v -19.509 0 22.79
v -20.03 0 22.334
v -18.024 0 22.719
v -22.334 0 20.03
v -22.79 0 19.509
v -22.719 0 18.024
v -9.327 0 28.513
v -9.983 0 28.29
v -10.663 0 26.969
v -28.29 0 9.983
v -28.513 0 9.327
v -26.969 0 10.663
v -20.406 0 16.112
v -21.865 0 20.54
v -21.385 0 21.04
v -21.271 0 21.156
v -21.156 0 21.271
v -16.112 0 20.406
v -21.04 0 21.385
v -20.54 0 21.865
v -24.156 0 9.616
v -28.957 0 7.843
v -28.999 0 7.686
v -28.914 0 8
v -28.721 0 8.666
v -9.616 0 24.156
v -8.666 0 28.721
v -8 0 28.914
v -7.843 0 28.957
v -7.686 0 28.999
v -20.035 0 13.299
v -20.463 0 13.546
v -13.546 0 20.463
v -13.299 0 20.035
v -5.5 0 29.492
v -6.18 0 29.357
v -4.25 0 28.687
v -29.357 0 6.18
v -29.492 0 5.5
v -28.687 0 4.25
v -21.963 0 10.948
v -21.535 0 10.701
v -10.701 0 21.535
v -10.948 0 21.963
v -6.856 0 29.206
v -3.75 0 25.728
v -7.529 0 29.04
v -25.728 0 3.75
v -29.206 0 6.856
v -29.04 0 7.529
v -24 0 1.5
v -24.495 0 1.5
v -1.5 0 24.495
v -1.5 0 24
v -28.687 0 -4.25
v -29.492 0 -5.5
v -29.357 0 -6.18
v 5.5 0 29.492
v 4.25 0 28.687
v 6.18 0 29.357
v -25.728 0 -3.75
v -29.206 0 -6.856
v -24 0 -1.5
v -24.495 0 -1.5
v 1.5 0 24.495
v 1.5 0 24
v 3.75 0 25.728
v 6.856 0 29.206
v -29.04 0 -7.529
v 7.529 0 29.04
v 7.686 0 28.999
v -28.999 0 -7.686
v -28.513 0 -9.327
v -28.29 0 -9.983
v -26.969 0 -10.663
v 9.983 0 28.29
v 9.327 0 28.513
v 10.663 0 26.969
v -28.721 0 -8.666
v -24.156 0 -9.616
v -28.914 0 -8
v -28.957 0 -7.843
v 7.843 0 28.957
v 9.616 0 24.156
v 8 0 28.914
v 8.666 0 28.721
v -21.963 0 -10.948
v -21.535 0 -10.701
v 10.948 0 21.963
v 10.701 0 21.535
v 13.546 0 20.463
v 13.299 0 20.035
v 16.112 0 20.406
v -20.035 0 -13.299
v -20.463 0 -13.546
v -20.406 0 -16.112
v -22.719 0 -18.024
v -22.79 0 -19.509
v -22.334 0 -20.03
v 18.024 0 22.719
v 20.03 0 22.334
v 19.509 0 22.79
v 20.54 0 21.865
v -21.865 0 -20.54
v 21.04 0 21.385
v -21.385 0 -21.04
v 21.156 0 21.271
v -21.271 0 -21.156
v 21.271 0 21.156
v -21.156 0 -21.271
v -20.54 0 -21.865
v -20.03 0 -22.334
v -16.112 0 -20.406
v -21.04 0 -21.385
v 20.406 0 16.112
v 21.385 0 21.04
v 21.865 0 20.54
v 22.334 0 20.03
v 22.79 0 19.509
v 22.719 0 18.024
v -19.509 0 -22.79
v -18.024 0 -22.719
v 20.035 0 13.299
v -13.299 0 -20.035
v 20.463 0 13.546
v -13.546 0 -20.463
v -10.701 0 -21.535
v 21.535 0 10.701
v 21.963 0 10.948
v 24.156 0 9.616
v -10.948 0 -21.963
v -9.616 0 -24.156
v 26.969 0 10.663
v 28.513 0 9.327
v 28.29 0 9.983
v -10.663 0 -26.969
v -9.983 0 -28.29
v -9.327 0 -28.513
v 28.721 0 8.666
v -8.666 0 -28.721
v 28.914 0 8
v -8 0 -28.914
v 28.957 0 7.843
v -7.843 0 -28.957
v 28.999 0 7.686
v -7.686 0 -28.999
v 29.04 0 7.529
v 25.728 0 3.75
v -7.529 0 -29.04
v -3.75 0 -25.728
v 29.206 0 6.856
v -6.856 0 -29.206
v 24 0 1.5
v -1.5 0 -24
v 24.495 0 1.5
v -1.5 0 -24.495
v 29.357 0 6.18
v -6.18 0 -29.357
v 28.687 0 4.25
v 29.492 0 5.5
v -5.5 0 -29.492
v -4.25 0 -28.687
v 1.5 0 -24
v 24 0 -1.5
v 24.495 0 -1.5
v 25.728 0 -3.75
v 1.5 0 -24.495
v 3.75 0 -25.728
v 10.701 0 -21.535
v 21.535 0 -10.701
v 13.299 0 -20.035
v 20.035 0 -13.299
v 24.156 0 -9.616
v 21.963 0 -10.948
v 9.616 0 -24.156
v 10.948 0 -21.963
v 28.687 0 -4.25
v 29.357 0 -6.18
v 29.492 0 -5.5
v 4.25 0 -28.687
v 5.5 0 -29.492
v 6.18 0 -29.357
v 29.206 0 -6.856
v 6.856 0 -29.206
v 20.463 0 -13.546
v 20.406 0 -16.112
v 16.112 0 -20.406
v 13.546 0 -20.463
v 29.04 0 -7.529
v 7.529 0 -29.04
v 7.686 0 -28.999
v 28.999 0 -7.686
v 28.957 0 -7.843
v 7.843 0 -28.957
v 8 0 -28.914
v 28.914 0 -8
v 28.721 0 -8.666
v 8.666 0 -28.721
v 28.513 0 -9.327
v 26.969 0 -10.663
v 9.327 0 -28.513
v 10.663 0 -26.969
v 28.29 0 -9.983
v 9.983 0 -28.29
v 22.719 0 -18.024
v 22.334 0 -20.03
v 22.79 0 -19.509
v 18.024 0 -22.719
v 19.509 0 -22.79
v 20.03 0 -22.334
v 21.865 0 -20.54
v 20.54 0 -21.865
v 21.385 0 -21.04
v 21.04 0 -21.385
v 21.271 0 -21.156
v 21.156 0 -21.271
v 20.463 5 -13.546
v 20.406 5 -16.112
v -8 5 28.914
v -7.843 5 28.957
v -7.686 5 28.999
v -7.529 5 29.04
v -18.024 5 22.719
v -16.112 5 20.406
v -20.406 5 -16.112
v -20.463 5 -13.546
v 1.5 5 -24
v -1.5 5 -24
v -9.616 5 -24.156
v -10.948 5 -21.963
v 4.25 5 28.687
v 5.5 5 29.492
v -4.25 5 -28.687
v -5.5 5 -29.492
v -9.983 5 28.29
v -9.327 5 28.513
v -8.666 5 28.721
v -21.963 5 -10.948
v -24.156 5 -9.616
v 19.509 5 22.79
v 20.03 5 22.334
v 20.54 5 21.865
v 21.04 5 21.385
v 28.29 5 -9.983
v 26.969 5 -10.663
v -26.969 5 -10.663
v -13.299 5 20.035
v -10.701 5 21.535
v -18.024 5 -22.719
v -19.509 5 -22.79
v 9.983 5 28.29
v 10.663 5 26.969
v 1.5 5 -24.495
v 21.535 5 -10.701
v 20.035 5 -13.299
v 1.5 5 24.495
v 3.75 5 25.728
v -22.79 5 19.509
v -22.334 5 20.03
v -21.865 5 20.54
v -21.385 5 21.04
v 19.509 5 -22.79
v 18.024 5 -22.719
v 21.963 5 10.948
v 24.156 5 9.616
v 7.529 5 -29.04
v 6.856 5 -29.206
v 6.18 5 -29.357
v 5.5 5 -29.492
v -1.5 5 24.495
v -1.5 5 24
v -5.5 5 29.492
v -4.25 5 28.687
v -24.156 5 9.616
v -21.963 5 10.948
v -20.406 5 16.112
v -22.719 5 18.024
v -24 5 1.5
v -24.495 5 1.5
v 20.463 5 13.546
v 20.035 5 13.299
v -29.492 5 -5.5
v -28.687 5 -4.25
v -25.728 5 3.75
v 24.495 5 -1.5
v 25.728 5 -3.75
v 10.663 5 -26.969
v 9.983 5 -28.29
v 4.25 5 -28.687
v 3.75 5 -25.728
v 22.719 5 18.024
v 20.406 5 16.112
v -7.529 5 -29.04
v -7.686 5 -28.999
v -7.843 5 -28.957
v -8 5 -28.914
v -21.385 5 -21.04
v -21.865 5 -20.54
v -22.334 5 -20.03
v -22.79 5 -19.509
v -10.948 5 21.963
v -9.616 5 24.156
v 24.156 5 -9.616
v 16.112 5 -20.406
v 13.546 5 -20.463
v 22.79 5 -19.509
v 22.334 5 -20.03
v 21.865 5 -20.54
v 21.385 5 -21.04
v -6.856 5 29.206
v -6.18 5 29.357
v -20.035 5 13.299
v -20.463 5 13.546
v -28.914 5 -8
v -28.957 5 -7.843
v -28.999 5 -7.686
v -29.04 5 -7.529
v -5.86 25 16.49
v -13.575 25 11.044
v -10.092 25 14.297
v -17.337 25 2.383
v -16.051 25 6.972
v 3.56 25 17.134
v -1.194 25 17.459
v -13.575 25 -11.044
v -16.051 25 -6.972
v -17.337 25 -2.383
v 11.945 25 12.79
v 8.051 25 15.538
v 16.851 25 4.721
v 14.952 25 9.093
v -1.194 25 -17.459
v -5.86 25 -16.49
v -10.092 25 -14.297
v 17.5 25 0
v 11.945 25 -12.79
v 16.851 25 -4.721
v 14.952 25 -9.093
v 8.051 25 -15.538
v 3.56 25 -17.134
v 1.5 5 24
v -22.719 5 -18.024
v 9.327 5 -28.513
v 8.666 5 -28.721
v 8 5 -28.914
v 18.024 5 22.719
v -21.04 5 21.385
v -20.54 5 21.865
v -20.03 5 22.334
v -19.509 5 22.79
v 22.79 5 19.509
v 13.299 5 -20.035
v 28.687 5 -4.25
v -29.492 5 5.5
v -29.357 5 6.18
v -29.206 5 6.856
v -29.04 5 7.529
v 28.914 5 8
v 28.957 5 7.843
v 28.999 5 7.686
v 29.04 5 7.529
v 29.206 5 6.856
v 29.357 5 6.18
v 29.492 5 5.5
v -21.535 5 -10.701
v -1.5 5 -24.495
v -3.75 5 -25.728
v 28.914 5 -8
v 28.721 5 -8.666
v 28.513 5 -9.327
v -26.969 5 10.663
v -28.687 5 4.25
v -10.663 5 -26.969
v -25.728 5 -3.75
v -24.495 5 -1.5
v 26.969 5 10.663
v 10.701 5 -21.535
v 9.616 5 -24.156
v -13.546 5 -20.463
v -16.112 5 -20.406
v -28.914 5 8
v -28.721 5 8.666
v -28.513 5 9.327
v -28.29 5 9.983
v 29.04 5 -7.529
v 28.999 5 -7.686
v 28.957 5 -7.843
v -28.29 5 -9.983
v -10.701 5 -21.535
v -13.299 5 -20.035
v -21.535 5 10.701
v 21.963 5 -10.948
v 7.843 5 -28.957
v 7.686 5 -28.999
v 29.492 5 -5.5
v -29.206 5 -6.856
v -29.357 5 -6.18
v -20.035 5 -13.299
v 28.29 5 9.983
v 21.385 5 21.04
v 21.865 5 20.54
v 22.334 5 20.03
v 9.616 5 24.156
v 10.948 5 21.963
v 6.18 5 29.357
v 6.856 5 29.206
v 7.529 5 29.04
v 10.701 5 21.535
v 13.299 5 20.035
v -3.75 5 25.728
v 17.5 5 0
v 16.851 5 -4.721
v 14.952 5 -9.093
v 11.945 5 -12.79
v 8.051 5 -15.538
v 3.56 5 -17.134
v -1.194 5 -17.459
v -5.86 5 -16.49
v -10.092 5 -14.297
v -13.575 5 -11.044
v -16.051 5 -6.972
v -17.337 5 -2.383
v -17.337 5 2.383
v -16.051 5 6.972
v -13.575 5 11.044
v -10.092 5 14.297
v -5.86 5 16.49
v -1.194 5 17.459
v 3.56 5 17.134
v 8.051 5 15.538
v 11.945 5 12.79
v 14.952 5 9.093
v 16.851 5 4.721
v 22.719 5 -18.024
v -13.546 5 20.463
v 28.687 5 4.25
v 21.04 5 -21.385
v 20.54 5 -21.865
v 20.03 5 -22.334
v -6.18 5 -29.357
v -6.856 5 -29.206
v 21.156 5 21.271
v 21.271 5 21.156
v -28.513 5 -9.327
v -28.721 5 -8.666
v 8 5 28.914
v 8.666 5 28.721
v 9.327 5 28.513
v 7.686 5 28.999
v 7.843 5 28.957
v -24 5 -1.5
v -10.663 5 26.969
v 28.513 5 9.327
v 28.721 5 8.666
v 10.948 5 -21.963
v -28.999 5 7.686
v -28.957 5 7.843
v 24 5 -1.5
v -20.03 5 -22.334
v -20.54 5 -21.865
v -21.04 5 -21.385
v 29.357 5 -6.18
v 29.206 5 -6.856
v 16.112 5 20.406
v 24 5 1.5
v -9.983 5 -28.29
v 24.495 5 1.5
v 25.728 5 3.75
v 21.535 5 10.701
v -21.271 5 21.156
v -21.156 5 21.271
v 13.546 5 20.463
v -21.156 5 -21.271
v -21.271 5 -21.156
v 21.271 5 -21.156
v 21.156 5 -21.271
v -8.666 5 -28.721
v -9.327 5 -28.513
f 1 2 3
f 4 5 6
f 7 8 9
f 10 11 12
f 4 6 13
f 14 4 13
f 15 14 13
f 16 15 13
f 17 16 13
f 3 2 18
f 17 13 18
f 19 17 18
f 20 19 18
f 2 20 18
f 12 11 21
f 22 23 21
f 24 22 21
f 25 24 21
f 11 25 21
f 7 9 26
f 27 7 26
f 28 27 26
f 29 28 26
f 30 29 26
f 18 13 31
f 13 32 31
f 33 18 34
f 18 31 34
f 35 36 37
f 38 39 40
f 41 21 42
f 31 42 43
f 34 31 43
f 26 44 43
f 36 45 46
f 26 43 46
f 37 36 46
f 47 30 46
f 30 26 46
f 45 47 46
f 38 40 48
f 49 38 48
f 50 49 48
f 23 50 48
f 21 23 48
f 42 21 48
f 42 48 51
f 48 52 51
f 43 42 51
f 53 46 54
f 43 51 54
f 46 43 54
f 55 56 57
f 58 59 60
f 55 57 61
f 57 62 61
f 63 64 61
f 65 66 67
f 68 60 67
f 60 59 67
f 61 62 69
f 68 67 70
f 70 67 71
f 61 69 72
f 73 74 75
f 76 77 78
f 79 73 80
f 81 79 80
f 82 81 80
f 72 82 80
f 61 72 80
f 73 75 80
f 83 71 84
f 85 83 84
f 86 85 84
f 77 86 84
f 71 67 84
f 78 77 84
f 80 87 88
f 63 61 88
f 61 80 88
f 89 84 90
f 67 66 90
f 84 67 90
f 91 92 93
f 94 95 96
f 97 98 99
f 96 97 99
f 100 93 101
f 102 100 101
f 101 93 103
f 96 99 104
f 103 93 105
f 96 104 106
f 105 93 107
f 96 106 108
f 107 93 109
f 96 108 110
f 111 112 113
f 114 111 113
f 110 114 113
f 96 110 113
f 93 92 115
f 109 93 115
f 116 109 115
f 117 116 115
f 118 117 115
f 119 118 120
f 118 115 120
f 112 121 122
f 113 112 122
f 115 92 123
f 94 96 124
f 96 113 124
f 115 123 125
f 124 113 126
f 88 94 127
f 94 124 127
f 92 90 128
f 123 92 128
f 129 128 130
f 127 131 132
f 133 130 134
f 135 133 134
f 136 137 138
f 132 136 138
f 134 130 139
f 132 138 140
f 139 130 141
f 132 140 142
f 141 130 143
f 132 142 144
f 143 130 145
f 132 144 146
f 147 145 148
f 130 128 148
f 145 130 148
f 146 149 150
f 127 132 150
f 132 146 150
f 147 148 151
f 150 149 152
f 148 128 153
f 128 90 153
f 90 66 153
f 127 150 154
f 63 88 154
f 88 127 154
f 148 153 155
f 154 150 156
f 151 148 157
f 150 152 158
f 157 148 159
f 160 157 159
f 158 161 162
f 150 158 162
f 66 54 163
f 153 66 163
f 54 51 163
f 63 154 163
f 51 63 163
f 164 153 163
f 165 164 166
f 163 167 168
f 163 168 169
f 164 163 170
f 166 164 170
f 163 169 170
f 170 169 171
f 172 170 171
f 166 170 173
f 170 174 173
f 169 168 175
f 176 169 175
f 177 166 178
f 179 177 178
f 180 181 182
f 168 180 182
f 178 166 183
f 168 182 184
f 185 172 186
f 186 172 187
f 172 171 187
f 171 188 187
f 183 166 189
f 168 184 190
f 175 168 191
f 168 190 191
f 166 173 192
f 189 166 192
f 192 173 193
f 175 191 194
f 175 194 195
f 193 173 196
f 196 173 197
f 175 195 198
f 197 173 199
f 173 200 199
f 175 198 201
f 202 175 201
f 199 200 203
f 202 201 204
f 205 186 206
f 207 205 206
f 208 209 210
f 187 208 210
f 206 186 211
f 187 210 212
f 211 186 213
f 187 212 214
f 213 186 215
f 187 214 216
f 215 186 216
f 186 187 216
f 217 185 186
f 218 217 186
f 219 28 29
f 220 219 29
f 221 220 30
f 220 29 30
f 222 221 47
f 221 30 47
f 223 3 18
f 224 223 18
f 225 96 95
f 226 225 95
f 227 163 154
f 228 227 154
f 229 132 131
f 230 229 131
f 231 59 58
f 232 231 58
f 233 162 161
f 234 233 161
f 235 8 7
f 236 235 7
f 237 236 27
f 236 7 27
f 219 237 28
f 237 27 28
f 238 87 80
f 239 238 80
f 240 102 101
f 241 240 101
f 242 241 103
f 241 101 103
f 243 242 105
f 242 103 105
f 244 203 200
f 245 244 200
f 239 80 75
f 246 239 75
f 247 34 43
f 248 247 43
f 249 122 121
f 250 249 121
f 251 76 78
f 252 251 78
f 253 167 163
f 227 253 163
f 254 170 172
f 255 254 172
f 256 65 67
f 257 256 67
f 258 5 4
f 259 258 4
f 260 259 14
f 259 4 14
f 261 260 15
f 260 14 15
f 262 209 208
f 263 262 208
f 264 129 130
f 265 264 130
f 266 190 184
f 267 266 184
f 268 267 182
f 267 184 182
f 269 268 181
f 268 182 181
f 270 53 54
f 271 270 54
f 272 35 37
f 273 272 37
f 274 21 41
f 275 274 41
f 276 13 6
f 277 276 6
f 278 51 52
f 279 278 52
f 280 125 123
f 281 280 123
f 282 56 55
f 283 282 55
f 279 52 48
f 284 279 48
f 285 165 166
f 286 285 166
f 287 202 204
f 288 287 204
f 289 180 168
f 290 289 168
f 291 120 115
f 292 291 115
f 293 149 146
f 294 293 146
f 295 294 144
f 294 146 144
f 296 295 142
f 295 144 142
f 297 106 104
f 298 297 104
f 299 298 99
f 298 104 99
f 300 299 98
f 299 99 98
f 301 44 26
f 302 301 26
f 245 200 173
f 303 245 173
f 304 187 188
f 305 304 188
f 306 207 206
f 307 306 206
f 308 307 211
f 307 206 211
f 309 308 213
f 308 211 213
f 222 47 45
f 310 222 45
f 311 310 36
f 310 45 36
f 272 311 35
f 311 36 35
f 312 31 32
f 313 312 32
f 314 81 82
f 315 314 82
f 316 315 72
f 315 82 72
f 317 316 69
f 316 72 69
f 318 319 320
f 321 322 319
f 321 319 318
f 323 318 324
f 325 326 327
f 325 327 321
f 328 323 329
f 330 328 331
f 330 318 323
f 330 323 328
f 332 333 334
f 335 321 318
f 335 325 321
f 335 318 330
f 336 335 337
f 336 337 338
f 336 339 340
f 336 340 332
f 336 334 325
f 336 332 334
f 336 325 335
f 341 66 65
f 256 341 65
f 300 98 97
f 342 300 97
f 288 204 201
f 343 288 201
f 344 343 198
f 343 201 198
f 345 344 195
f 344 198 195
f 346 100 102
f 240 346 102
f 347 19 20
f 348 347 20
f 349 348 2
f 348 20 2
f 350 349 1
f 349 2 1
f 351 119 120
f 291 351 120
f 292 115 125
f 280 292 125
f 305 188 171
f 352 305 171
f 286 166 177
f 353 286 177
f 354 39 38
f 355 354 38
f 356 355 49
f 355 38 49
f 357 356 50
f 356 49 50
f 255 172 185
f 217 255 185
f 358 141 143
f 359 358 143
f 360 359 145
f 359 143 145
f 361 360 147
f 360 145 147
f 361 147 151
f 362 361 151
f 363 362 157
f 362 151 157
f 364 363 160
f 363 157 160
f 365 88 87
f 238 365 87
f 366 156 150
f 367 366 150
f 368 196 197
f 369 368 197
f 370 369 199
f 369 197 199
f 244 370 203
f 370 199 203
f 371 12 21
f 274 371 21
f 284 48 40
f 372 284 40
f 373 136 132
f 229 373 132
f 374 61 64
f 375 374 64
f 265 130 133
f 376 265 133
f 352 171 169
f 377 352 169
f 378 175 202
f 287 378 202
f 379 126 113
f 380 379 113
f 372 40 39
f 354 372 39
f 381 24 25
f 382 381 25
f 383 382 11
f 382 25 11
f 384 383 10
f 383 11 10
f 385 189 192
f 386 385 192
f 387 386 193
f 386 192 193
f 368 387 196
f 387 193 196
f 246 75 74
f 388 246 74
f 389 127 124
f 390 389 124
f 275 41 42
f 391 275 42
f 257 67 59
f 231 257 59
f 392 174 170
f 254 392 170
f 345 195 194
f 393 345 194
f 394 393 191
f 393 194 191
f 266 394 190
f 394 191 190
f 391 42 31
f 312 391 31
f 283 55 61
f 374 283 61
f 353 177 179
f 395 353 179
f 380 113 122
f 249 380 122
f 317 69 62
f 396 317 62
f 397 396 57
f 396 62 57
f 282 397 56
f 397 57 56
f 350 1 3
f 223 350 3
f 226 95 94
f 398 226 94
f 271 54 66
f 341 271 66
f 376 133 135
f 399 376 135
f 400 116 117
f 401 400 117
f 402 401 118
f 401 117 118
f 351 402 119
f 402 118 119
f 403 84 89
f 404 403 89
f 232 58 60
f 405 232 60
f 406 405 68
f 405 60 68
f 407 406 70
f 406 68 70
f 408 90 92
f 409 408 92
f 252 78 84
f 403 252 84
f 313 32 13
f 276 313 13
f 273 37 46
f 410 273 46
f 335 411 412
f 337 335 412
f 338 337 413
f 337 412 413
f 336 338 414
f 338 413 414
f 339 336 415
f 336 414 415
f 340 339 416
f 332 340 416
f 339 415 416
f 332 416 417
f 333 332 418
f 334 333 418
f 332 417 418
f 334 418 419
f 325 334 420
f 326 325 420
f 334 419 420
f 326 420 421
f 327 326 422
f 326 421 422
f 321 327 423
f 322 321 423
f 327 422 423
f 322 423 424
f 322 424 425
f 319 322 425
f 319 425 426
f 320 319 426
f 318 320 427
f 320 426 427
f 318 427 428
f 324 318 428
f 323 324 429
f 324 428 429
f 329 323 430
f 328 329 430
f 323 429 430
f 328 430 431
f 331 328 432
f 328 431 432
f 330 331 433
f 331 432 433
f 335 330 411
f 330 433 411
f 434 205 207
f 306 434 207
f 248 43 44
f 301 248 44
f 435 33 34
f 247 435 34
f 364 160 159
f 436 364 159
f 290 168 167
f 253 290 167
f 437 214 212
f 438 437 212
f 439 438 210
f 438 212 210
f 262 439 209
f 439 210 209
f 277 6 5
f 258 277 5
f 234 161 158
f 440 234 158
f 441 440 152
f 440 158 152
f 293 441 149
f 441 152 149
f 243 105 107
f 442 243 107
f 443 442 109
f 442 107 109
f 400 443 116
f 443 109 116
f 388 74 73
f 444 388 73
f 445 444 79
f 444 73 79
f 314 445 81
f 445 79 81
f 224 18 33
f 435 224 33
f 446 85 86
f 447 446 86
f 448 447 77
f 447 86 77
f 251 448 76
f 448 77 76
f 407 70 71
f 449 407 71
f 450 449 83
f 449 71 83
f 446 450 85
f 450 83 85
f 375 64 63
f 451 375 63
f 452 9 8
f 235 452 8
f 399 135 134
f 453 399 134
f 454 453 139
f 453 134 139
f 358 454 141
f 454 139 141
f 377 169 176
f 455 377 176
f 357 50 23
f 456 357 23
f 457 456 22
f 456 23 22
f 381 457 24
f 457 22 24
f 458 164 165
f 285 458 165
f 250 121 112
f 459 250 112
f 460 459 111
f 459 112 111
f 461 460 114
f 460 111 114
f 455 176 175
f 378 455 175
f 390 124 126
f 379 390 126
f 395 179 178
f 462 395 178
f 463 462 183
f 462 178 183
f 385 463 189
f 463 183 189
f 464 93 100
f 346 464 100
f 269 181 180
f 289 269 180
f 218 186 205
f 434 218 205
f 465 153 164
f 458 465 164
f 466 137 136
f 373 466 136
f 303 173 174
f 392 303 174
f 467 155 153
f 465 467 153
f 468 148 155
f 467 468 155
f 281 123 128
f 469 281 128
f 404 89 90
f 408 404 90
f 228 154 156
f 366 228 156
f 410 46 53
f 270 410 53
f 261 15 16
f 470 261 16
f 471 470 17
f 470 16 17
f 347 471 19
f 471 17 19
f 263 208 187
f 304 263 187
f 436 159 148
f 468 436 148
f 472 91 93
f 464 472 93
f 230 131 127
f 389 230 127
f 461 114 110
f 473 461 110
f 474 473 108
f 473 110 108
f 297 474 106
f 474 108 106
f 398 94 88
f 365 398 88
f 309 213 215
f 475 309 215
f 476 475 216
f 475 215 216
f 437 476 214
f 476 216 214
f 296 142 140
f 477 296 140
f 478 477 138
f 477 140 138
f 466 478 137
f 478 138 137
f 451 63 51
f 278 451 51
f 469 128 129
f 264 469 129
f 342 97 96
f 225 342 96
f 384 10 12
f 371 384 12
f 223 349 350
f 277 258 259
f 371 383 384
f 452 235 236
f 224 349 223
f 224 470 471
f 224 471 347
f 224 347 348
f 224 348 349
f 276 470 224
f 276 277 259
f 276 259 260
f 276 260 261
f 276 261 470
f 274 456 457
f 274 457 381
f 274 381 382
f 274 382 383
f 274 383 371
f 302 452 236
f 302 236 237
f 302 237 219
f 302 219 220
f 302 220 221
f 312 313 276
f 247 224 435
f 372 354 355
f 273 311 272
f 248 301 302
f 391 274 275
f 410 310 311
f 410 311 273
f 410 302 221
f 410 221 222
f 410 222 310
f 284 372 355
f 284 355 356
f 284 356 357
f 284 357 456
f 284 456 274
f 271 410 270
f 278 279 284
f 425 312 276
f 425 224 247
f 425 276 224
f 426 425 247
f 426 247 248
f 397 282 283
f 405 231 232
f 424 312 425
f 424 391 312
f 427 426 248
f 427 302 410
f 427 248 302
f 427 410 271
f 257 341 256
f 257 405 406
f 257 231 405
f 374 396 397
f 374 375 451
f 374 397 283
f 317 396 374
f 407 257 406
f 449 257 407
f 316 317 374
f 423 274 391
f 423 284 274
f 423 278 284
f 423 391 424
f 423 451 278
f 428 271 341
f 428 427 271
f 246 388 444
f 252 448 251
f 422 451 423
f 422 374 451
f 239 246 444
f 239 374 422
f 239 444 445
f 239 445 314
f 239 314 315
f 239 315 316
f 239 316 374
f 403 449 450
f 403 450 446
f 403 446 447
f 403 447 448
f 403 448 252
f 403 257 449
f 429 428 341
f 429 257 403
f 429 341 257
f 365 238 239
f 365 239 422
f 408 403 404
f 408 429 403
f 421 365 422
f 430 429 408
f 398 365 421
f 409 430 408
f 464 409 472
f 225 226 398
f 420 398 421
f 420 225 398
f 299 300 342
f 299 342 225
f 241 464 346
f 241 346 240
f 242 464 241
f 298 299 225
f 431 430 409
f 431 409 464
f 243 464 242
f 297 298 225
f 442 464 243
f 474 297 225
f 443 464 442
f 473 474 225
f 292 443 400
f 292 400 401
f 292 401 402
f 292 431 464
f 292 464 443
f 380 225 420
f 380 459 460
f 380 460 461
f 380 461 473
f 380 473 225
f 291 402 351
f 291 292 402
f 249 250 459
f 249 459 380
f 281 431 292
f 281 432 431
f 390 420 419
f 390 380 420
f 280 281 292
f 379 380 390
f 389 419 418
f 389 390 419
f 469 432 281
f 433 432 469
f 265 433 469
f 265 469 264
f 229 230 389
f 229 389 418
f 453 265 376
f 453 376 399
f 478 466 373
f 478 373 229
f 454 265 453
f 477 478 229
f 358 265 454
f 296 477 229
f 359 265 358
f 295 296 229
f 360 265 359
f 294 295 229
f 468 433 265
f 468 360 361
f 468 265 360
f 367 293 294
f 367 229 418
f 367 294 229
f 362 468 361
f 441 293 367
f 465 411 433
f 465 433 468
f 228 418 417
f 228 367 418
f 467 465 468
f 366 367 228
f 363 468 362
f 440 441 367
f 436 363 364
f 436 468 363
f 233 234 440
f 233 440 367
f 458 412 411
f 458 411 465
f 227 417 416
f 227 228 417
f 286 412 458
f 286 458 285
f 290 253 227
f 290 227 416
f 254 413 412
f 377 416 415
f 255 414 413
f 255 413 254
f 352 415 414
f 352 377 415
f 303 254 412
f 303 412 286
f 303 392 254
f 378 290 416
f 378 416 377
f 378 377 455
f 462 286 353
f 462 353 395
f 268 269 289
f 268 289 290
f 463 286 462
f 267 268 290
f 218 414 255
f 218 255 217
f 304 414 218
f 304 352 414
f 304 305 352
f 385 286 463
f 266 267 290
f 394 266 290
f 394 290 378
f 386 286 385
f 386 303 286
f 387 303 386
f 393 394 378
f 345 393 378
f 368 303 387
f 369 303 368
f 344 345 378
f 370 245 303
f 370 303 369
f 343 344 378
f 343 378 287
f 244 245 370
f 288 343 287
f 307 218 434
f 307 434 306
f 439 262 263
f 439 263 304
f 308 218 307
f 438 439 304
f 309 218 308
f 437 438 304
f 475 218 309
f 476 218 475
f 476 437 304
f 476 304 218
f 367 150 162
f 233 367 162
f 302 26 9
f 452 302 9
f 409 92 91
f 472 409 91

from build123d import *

# Parameters (mm, degrees)
BOSS_EXTRUDE1_DEPTH = 5
SKETCH2_R           = 17.5
BOSS_EXTRUDE3_DEPTH = 20


with BuildPart() as part:
    # Sketch1 → Boss-Extrude1 (new body)
    with BuildSketch(Plane(origin=(0, 0, 0), x_dir=(1, 0, 0), z_dir=(0, 1, 0))):
        with BuildLine():
            Line((-1.5, 24.494818027), (-3.75, 25.728146066))
            Line((-3.75, 25.728146066), (-4.25, 28.686887248))
            Line((-4.25, 28.686887248), (-5.5, 29.491524206))
            ThreePointArc((-5.5, 29.491524206), (-6.518225952, 29.283318296), (-7.528629065, 29.039968051))
            ThreePointArc((-7.528629065, 29.039968051), (-7.764571353, 28.977774789), (-8, 28.91366459))
            ThreePointArc((-8, 28.91366459), (-8.996709886, 28.619210528), (-9.982622382, 28.290409159))
            Line((-9.982622382, 28.290409159), (-10.662835658, 26.968573113))
            Line((-10.662835658, 26.968573113), (-9.616477769, 24.156228086))
            Line((-9.616477769, 24.156228086), (-10.948370908, 21.963134673))
            Line((-10.948370908, 21.963134673), (-10.700961894, 21.534609691))
            Line((-10.700961894, 21.534609691), (-13.299038106, 20.034609691))
            Line((-13.299038106, 20.034609691), (-13.546447119, 20.463134673))
            Line((-13.546447119, 20.463134673), (-16.111668297, 20.406228086))
            Line((-16.111668297, 20.406228086), (-18.02405159, 22.718573113))
            Line((-18.02405159, 22.718573113), (-19.508901824, 22.790409159))
            ThreePointArc((-19.508901824, 22.790409159), (-20.28660841, 22.100984575), (-21.039968051, 21.385035525))
            ThreePointArc((-21.039968051, 21.385035525), (-21.213203436, 21.213203436), (-21.385035525, 21.039968051))
            ThreePointArc((-21.385035525, 21.039968051), (-22.100984575, 20.28660841), (-22.790409159, 19.508901824))
            Line((-22.790409159, 19.508901824), (-22.718573113, 18.02405159))
            Line((-22.718573113, 18.02405159), (-20.406228086, 16.111668297))
            Line((-20.406228086, 16.111668297), (-20.463134673, 13.546447119))
            Line((-20.463134673, 13.546447119), (-20.034609691, 13.299038106))
            Line((-20.034609691, 13.299038106), (-21.534609691, 10.700961894))
            Line((-21.534609691, 10.700961894), (-21.963134673, 10.948370908))
            Line((-21.963134673, 10.948370908), (-24.156228086, 9.616477769))
            Line((-24.156228086, 9.616477769), (-26.968573113, 10.662835658))
            Line((-26.968573113, 10.662835658), (-28.290409159, 9.982622382))
            ThreePointArc((-28.290409159, 9.982622382), (-28.619210528, 8.996709886), (-28.91366459, 8))
            ThreePointArc((-28.91366459, 8), (-28.977774789, 7.764571353), (-29.039968051, 7.528629065))
            ThreePointArc((-29.039968051, 7.528629065), (-29.283318296, 6.518225952), (-29.491524206, 5.5))
            Line((-29.491524206, 5.5), (-28.686887248, 4.25))
            Line((-28.686887248, 4.25), (-25.728146066, 3.75))
            Line((-25.728146066, 3.75), (-24.494818027, 1.5))
            Line((-24.494818027, 1.5), (-24, 1.5))
            Line((-24, 1.5), (-24, -1.5))
            Line((-24, -1.5), (-24.494818027, -1.5))
            Line((-24.494818027, -1.5), (-25.728146066, -3.75))
            Line((-25.728146066, -3.75), (-28.686887248, -4.25))
            Line((-28.686887248, -4.25), (-29.491524206, -5.5))
            ThreePointArc((-29.491524206, -5.5), (-29.283318296, -6.518225952), (-29.039968051, -7.528629065))
            ThreePointArc((-29.039968051, -7.528629065), (-28.977774789, -7.764571353), (-28.91366459, -8))
            ThreePointArc((-28.91366459, -8), (-28.619210528, -8.996709886), (-28.290409159, -9.982622382))
            Line((-28.290409159, -9.982622382), (-26.968573113, -10.662835658))
            Line((-26.968573113, -10.662835658), (-24.156228086, -9.616477769))
            Line((-24.156228086, -9.616477769), (-21.963134673, -10.948370908))
            Line((-21.963134673, -10.948370908), (-21.534609691, -10.700961894))
            Line((-21.534609691, -10.700961894), (-20.034609691, -13.299038106))
            Line((-20.034609691, -13.299038106), (-20.463134673, -13.546447119))
            Line((-20.463134673, -13.546447119), (-20.406228086, -16.111668297))
            Line((-20.406228086, -16.111668297), (-22.718573113, -18.02405159))
            Line((-22.718573113, -18.02405159), (-22.790409159, -19.508901824))
            ThreePointArc((-22.790409159, -19.508901824), (-22.100984575, -20.28660841), (-21.385035525, -21.039968051))
            ThreePointArc((-21.385035525, -21.039968051), (-21.213203436, -21.213203436), (-21.039968051, -21.385035525))
            ThreePointArc((-21.039968051, -21.385035525), (-20.28660841, -22.100984575), (-19.508901824, -22.790409159))
            Line((-19.508901824, -22.790409159), (-18.02405159, -22.718573113))
            Line((-18.02405159, -22.718573113), (-16.111668297, -20.406228086))
            Line((-16.111668297, -20.406228086), (-13.546447119, -20.463134673))
            Line((-13.546447119, -20.463134673), (-13.299038106, -20.034609691))
            Line((-13.299038106, -20.034609691), (-10.700961894, -21.534609691))
            Line((-10.700961894, -21.534609691), (-10.948370908, -21.963134673))
            Line((-10.948370908, -21.963134673), (-9.616477769, -24.156228086))
            Line((-9.616477769, -24.156228086), (-10.662835658, -26.968573113))
            Line((-10.662835658, -26.968573113), (-9.982622382, -28.290409159))
            ThreePointArc((-9.982622382, -28.290409159), (-8.996709886, -28.619210528), (-8, -28.91366459))
            ThreePointArc((-8, -28.91366459), (-7.764571353, -28.977774789), (-7.528629065, -29.039968051))
            ThreePointArc((-7.528629065, -29.039968051), (-6.518225952, -29.283318296), (-5.5, -29.491524206))
            Line((-5.5, -29.491524206), (-4.25, -28.686887248))
            Line((-4.25, -28.686887248), (-3.75, -25.728146066))
            Line((-3.75, -25.728146066), (-1.5, -24.494818027))
            Line((-1.5, -24.494818027), (-1.5, -24))
            Line((-1.5, -24), (1.5, -24))
            Line((1.5, -24), (1.5, -24.494818027))
            Line((1.5, -24.494818027), (3.75, -25.728146066))
            Line((3.75, -25.728146066), (4.25, -28.686887248))
            Line((4.25, -28.686887248), (5.5, -29.491524206))
            ThreePointArc((5.5, -29.491524206), (6.518225952, -29.283318296), (7.528629065, -29.039968051))
            ThreePointArc((7.528629065, -29.039968051), (7.764571353, -28.977774789), (8, -28.91366459))
            ThreePointArc((8, -28.91366459), (8.996709886, -28.619210528), (9.982622382, -28.290409159))
            Line((9.982622382, -28.290409159), (10.662835658, -26.968573113))
            Line((10.662835658, -26.968573113), (9.616477769, -24.156228086))
            Line((9.616477769, -24.156228086), (10.948370908, -21.963134673))
            Line((10.948370908, -21.963134673), (10.700961894, -21.534609691))
            Line((10.700961894, -21.534609691), (13.299038106, -20.034609691))
            Line((13.299038106, -20.034609691), (13.546447119, -20.463134673))
            Line((13.546447119, -20.463134673), (16.111668297, -20.406228086))
            Line((16.111668297, -20.406228086), (18.02405159, -22.718573113))
            Line((18.02405159, -22.718573113), (19.508901824, -22.790409159))
            ThreePointArc((19.508901824, -22.790409159), (20.28660841, -22.100984575), (21.039968051, -21.385035525))
            ThreePointArc((21.039968051, -21.385035525), (21.213203436, -21.213203436), (21.385035525, -21.039968051))
            ThreePointArc((21.385035525, -21.039968051), (22.100984575, -20.28660841), (22.790409159, -19.508901824))
            Line((22.790409159, -19.508901824), (22.718573113, -18.02405159))
            Line((22.718573113, -18.02405159), (20.406228086, -16.111668297))
            Line((20.406228086, -16.111668297), (20.463134673, -13.546447119))
            Line((20.463134673, -13.546447119), (20.034609691, -13.299038106))
            Line((20.034609691, -13.299038106), (21.534609691, -10.700961894))
            Line((21.534609691, -10.700961894), (21.963134673, -10.948370908))
            Line((21.963134673, -10.948370908), (24.156228086, -9.616477769))
            Line((24.156228086, -9.616477769), (26.968573113, -10.662835658))
            Line((26.968573113, -10.662835658), (28.290409159, -9.982622382))
            ThreePointArc((28.290409159, -9.982622382), (28.619210528, -8.996709886), (28.91366459, -8))
            ThreePointArc((28.91366459, -8), (28.977774789, -7.764571353), (29.039968051, -7.528629065))
            ThreePointArc((29.039968051, -7.528629065), (29.283318296, -6.518225952), (29.491524206, -5.5))
            Line((29.491524206, -5.5), (28.686887248, -4.25))
            Line((28.686887248, -4.25), (25.728146066, -3.75))
            Line((25.728146066, -3.75), (24.494818027, -1.5))
            Line((24.494818027, -1.5), (24, -1.5))
            Line((24, -1.5), (24, 1.5))
            Line((24, 1.5), (24.494818027, 1.5))
            Line((24.494818027, 1.5), (25.728146066, 3.75))
            Line((25.728146066, 3.75), (28.686887248, 4.25))
            Line((28.686887248, 4.25), (29.491524206, 5.5))
            ThreePointArc((29.491524206, 5.5), (29.283318296, 6.518225952), (29.039968051, 7.528629065))
            ThreePointArc((29.039968051, 7.528629065), (28.977774789, 7.764571353), (28.91366459, 8))
            ThreePointArc((28.91366459, 8), (28.619210528, 8.996709886), (28.290409159, 9.982622382))
            Line((28.290409159, 9.982622382), (26.968573113, 10.662835658))
            Line((26.968573113, 10.662835658), (24.156228086, 9.616477769))
            Line((24.156228086, 9.616477769), (21.963134673, 10.948370908))
            Line((21.963134673, 10.948370908), (21.534609691, 10.700961894))
            Line((21.534609691, 10.700961894), (20.034609691, 13.299038106))
            Line((20.034609691, 13.299038106), (20.463134673, 13.546447119))
            Line((20.463134673, 13.546447119), (20.406228086, 16.111668297))
            Line((20.406228086, 16.111668297), (22.718573113, 18.02405159))
            Line((22.718573113, 18.02405159), (22.790409159, 19.508901824))
            ThreePointArc((22.790409159, 19.508901824), (22.100984575, 20.28660841), (21.385035525, 21.039968051))
            ThreePointArc((21.385035525, 21.039968051), (21.213203436, 21.213203436), (21.039968051, 21.385035525))
            ThreePointArc((21.039968051, 21.385035525), (20.28660841, 22.100984575), (19.508901824, 22.790409159))
            Line((19.508901824, 22.790409159), (18.02405159, 22.718573113))
            Line((18.02405159, 22.718573113), (16.111668297, 20.406228086))
            Line((16.111668297, 20.406228086), (13.546447119, 20.463134673))
            Line((13.546447119, 20.463134673), (13.299038106, 20.034609691))
            Line((13.299038106, 20.034609691), (10.700961894, 21.534609691))
            Line((10.700961894, 21.534609691), (10.948370908, 21.963134673))
            Line((10.948370908, 21.963134673), (9.616477769, 24.156228086))
            Line((9.616477769, 24.156228086), (10.662835658, 26.968573113))
            Line((10.662835658, 26.968573113), (9.982622382, 28.290409159))
            ThreePointArc((9.982622382, 28.290409159), (8.996709886, 28.619210528), (8, 28.91366459))
            ThreePointArc((8, 28.91366459), (7.764571353, 28.977774789), (7.528629065, 29.039968051))
            ThreePointArc((7.528629065, 29.039968051), (6.518225952, 29.283318296), (5.5, 29.491524206))
            Line((5.5, 29.491524206), (4.25, 28.686887248))
            Line((4.25, 28.686887248), (3.75, 25.728146066))
            Line((3.75, 25.728146066), (1.5, 24.494818027))
            Line((1.5, 24.494818027), (1.5, 24))
            Line((1.5, 24), (-1.5, 24))
            Line((-1.5, 24), (-1.5, 24.494818027))
        make_face()
    extrude(amount=BOSS_EXTRUDE1_DEPTH)

    # Sketch2 → Boss-Extrude3 (add)
    with BuildSketch(Plane(origin=(0, 5, 0), x_dir=(1, 0, 0), z_dir=(0, 1, 0))):
        Circle(SKETCH2_R)
    extrude(amount=BOSS_EXTRUDE3_DEPTH)


solid = part.part
